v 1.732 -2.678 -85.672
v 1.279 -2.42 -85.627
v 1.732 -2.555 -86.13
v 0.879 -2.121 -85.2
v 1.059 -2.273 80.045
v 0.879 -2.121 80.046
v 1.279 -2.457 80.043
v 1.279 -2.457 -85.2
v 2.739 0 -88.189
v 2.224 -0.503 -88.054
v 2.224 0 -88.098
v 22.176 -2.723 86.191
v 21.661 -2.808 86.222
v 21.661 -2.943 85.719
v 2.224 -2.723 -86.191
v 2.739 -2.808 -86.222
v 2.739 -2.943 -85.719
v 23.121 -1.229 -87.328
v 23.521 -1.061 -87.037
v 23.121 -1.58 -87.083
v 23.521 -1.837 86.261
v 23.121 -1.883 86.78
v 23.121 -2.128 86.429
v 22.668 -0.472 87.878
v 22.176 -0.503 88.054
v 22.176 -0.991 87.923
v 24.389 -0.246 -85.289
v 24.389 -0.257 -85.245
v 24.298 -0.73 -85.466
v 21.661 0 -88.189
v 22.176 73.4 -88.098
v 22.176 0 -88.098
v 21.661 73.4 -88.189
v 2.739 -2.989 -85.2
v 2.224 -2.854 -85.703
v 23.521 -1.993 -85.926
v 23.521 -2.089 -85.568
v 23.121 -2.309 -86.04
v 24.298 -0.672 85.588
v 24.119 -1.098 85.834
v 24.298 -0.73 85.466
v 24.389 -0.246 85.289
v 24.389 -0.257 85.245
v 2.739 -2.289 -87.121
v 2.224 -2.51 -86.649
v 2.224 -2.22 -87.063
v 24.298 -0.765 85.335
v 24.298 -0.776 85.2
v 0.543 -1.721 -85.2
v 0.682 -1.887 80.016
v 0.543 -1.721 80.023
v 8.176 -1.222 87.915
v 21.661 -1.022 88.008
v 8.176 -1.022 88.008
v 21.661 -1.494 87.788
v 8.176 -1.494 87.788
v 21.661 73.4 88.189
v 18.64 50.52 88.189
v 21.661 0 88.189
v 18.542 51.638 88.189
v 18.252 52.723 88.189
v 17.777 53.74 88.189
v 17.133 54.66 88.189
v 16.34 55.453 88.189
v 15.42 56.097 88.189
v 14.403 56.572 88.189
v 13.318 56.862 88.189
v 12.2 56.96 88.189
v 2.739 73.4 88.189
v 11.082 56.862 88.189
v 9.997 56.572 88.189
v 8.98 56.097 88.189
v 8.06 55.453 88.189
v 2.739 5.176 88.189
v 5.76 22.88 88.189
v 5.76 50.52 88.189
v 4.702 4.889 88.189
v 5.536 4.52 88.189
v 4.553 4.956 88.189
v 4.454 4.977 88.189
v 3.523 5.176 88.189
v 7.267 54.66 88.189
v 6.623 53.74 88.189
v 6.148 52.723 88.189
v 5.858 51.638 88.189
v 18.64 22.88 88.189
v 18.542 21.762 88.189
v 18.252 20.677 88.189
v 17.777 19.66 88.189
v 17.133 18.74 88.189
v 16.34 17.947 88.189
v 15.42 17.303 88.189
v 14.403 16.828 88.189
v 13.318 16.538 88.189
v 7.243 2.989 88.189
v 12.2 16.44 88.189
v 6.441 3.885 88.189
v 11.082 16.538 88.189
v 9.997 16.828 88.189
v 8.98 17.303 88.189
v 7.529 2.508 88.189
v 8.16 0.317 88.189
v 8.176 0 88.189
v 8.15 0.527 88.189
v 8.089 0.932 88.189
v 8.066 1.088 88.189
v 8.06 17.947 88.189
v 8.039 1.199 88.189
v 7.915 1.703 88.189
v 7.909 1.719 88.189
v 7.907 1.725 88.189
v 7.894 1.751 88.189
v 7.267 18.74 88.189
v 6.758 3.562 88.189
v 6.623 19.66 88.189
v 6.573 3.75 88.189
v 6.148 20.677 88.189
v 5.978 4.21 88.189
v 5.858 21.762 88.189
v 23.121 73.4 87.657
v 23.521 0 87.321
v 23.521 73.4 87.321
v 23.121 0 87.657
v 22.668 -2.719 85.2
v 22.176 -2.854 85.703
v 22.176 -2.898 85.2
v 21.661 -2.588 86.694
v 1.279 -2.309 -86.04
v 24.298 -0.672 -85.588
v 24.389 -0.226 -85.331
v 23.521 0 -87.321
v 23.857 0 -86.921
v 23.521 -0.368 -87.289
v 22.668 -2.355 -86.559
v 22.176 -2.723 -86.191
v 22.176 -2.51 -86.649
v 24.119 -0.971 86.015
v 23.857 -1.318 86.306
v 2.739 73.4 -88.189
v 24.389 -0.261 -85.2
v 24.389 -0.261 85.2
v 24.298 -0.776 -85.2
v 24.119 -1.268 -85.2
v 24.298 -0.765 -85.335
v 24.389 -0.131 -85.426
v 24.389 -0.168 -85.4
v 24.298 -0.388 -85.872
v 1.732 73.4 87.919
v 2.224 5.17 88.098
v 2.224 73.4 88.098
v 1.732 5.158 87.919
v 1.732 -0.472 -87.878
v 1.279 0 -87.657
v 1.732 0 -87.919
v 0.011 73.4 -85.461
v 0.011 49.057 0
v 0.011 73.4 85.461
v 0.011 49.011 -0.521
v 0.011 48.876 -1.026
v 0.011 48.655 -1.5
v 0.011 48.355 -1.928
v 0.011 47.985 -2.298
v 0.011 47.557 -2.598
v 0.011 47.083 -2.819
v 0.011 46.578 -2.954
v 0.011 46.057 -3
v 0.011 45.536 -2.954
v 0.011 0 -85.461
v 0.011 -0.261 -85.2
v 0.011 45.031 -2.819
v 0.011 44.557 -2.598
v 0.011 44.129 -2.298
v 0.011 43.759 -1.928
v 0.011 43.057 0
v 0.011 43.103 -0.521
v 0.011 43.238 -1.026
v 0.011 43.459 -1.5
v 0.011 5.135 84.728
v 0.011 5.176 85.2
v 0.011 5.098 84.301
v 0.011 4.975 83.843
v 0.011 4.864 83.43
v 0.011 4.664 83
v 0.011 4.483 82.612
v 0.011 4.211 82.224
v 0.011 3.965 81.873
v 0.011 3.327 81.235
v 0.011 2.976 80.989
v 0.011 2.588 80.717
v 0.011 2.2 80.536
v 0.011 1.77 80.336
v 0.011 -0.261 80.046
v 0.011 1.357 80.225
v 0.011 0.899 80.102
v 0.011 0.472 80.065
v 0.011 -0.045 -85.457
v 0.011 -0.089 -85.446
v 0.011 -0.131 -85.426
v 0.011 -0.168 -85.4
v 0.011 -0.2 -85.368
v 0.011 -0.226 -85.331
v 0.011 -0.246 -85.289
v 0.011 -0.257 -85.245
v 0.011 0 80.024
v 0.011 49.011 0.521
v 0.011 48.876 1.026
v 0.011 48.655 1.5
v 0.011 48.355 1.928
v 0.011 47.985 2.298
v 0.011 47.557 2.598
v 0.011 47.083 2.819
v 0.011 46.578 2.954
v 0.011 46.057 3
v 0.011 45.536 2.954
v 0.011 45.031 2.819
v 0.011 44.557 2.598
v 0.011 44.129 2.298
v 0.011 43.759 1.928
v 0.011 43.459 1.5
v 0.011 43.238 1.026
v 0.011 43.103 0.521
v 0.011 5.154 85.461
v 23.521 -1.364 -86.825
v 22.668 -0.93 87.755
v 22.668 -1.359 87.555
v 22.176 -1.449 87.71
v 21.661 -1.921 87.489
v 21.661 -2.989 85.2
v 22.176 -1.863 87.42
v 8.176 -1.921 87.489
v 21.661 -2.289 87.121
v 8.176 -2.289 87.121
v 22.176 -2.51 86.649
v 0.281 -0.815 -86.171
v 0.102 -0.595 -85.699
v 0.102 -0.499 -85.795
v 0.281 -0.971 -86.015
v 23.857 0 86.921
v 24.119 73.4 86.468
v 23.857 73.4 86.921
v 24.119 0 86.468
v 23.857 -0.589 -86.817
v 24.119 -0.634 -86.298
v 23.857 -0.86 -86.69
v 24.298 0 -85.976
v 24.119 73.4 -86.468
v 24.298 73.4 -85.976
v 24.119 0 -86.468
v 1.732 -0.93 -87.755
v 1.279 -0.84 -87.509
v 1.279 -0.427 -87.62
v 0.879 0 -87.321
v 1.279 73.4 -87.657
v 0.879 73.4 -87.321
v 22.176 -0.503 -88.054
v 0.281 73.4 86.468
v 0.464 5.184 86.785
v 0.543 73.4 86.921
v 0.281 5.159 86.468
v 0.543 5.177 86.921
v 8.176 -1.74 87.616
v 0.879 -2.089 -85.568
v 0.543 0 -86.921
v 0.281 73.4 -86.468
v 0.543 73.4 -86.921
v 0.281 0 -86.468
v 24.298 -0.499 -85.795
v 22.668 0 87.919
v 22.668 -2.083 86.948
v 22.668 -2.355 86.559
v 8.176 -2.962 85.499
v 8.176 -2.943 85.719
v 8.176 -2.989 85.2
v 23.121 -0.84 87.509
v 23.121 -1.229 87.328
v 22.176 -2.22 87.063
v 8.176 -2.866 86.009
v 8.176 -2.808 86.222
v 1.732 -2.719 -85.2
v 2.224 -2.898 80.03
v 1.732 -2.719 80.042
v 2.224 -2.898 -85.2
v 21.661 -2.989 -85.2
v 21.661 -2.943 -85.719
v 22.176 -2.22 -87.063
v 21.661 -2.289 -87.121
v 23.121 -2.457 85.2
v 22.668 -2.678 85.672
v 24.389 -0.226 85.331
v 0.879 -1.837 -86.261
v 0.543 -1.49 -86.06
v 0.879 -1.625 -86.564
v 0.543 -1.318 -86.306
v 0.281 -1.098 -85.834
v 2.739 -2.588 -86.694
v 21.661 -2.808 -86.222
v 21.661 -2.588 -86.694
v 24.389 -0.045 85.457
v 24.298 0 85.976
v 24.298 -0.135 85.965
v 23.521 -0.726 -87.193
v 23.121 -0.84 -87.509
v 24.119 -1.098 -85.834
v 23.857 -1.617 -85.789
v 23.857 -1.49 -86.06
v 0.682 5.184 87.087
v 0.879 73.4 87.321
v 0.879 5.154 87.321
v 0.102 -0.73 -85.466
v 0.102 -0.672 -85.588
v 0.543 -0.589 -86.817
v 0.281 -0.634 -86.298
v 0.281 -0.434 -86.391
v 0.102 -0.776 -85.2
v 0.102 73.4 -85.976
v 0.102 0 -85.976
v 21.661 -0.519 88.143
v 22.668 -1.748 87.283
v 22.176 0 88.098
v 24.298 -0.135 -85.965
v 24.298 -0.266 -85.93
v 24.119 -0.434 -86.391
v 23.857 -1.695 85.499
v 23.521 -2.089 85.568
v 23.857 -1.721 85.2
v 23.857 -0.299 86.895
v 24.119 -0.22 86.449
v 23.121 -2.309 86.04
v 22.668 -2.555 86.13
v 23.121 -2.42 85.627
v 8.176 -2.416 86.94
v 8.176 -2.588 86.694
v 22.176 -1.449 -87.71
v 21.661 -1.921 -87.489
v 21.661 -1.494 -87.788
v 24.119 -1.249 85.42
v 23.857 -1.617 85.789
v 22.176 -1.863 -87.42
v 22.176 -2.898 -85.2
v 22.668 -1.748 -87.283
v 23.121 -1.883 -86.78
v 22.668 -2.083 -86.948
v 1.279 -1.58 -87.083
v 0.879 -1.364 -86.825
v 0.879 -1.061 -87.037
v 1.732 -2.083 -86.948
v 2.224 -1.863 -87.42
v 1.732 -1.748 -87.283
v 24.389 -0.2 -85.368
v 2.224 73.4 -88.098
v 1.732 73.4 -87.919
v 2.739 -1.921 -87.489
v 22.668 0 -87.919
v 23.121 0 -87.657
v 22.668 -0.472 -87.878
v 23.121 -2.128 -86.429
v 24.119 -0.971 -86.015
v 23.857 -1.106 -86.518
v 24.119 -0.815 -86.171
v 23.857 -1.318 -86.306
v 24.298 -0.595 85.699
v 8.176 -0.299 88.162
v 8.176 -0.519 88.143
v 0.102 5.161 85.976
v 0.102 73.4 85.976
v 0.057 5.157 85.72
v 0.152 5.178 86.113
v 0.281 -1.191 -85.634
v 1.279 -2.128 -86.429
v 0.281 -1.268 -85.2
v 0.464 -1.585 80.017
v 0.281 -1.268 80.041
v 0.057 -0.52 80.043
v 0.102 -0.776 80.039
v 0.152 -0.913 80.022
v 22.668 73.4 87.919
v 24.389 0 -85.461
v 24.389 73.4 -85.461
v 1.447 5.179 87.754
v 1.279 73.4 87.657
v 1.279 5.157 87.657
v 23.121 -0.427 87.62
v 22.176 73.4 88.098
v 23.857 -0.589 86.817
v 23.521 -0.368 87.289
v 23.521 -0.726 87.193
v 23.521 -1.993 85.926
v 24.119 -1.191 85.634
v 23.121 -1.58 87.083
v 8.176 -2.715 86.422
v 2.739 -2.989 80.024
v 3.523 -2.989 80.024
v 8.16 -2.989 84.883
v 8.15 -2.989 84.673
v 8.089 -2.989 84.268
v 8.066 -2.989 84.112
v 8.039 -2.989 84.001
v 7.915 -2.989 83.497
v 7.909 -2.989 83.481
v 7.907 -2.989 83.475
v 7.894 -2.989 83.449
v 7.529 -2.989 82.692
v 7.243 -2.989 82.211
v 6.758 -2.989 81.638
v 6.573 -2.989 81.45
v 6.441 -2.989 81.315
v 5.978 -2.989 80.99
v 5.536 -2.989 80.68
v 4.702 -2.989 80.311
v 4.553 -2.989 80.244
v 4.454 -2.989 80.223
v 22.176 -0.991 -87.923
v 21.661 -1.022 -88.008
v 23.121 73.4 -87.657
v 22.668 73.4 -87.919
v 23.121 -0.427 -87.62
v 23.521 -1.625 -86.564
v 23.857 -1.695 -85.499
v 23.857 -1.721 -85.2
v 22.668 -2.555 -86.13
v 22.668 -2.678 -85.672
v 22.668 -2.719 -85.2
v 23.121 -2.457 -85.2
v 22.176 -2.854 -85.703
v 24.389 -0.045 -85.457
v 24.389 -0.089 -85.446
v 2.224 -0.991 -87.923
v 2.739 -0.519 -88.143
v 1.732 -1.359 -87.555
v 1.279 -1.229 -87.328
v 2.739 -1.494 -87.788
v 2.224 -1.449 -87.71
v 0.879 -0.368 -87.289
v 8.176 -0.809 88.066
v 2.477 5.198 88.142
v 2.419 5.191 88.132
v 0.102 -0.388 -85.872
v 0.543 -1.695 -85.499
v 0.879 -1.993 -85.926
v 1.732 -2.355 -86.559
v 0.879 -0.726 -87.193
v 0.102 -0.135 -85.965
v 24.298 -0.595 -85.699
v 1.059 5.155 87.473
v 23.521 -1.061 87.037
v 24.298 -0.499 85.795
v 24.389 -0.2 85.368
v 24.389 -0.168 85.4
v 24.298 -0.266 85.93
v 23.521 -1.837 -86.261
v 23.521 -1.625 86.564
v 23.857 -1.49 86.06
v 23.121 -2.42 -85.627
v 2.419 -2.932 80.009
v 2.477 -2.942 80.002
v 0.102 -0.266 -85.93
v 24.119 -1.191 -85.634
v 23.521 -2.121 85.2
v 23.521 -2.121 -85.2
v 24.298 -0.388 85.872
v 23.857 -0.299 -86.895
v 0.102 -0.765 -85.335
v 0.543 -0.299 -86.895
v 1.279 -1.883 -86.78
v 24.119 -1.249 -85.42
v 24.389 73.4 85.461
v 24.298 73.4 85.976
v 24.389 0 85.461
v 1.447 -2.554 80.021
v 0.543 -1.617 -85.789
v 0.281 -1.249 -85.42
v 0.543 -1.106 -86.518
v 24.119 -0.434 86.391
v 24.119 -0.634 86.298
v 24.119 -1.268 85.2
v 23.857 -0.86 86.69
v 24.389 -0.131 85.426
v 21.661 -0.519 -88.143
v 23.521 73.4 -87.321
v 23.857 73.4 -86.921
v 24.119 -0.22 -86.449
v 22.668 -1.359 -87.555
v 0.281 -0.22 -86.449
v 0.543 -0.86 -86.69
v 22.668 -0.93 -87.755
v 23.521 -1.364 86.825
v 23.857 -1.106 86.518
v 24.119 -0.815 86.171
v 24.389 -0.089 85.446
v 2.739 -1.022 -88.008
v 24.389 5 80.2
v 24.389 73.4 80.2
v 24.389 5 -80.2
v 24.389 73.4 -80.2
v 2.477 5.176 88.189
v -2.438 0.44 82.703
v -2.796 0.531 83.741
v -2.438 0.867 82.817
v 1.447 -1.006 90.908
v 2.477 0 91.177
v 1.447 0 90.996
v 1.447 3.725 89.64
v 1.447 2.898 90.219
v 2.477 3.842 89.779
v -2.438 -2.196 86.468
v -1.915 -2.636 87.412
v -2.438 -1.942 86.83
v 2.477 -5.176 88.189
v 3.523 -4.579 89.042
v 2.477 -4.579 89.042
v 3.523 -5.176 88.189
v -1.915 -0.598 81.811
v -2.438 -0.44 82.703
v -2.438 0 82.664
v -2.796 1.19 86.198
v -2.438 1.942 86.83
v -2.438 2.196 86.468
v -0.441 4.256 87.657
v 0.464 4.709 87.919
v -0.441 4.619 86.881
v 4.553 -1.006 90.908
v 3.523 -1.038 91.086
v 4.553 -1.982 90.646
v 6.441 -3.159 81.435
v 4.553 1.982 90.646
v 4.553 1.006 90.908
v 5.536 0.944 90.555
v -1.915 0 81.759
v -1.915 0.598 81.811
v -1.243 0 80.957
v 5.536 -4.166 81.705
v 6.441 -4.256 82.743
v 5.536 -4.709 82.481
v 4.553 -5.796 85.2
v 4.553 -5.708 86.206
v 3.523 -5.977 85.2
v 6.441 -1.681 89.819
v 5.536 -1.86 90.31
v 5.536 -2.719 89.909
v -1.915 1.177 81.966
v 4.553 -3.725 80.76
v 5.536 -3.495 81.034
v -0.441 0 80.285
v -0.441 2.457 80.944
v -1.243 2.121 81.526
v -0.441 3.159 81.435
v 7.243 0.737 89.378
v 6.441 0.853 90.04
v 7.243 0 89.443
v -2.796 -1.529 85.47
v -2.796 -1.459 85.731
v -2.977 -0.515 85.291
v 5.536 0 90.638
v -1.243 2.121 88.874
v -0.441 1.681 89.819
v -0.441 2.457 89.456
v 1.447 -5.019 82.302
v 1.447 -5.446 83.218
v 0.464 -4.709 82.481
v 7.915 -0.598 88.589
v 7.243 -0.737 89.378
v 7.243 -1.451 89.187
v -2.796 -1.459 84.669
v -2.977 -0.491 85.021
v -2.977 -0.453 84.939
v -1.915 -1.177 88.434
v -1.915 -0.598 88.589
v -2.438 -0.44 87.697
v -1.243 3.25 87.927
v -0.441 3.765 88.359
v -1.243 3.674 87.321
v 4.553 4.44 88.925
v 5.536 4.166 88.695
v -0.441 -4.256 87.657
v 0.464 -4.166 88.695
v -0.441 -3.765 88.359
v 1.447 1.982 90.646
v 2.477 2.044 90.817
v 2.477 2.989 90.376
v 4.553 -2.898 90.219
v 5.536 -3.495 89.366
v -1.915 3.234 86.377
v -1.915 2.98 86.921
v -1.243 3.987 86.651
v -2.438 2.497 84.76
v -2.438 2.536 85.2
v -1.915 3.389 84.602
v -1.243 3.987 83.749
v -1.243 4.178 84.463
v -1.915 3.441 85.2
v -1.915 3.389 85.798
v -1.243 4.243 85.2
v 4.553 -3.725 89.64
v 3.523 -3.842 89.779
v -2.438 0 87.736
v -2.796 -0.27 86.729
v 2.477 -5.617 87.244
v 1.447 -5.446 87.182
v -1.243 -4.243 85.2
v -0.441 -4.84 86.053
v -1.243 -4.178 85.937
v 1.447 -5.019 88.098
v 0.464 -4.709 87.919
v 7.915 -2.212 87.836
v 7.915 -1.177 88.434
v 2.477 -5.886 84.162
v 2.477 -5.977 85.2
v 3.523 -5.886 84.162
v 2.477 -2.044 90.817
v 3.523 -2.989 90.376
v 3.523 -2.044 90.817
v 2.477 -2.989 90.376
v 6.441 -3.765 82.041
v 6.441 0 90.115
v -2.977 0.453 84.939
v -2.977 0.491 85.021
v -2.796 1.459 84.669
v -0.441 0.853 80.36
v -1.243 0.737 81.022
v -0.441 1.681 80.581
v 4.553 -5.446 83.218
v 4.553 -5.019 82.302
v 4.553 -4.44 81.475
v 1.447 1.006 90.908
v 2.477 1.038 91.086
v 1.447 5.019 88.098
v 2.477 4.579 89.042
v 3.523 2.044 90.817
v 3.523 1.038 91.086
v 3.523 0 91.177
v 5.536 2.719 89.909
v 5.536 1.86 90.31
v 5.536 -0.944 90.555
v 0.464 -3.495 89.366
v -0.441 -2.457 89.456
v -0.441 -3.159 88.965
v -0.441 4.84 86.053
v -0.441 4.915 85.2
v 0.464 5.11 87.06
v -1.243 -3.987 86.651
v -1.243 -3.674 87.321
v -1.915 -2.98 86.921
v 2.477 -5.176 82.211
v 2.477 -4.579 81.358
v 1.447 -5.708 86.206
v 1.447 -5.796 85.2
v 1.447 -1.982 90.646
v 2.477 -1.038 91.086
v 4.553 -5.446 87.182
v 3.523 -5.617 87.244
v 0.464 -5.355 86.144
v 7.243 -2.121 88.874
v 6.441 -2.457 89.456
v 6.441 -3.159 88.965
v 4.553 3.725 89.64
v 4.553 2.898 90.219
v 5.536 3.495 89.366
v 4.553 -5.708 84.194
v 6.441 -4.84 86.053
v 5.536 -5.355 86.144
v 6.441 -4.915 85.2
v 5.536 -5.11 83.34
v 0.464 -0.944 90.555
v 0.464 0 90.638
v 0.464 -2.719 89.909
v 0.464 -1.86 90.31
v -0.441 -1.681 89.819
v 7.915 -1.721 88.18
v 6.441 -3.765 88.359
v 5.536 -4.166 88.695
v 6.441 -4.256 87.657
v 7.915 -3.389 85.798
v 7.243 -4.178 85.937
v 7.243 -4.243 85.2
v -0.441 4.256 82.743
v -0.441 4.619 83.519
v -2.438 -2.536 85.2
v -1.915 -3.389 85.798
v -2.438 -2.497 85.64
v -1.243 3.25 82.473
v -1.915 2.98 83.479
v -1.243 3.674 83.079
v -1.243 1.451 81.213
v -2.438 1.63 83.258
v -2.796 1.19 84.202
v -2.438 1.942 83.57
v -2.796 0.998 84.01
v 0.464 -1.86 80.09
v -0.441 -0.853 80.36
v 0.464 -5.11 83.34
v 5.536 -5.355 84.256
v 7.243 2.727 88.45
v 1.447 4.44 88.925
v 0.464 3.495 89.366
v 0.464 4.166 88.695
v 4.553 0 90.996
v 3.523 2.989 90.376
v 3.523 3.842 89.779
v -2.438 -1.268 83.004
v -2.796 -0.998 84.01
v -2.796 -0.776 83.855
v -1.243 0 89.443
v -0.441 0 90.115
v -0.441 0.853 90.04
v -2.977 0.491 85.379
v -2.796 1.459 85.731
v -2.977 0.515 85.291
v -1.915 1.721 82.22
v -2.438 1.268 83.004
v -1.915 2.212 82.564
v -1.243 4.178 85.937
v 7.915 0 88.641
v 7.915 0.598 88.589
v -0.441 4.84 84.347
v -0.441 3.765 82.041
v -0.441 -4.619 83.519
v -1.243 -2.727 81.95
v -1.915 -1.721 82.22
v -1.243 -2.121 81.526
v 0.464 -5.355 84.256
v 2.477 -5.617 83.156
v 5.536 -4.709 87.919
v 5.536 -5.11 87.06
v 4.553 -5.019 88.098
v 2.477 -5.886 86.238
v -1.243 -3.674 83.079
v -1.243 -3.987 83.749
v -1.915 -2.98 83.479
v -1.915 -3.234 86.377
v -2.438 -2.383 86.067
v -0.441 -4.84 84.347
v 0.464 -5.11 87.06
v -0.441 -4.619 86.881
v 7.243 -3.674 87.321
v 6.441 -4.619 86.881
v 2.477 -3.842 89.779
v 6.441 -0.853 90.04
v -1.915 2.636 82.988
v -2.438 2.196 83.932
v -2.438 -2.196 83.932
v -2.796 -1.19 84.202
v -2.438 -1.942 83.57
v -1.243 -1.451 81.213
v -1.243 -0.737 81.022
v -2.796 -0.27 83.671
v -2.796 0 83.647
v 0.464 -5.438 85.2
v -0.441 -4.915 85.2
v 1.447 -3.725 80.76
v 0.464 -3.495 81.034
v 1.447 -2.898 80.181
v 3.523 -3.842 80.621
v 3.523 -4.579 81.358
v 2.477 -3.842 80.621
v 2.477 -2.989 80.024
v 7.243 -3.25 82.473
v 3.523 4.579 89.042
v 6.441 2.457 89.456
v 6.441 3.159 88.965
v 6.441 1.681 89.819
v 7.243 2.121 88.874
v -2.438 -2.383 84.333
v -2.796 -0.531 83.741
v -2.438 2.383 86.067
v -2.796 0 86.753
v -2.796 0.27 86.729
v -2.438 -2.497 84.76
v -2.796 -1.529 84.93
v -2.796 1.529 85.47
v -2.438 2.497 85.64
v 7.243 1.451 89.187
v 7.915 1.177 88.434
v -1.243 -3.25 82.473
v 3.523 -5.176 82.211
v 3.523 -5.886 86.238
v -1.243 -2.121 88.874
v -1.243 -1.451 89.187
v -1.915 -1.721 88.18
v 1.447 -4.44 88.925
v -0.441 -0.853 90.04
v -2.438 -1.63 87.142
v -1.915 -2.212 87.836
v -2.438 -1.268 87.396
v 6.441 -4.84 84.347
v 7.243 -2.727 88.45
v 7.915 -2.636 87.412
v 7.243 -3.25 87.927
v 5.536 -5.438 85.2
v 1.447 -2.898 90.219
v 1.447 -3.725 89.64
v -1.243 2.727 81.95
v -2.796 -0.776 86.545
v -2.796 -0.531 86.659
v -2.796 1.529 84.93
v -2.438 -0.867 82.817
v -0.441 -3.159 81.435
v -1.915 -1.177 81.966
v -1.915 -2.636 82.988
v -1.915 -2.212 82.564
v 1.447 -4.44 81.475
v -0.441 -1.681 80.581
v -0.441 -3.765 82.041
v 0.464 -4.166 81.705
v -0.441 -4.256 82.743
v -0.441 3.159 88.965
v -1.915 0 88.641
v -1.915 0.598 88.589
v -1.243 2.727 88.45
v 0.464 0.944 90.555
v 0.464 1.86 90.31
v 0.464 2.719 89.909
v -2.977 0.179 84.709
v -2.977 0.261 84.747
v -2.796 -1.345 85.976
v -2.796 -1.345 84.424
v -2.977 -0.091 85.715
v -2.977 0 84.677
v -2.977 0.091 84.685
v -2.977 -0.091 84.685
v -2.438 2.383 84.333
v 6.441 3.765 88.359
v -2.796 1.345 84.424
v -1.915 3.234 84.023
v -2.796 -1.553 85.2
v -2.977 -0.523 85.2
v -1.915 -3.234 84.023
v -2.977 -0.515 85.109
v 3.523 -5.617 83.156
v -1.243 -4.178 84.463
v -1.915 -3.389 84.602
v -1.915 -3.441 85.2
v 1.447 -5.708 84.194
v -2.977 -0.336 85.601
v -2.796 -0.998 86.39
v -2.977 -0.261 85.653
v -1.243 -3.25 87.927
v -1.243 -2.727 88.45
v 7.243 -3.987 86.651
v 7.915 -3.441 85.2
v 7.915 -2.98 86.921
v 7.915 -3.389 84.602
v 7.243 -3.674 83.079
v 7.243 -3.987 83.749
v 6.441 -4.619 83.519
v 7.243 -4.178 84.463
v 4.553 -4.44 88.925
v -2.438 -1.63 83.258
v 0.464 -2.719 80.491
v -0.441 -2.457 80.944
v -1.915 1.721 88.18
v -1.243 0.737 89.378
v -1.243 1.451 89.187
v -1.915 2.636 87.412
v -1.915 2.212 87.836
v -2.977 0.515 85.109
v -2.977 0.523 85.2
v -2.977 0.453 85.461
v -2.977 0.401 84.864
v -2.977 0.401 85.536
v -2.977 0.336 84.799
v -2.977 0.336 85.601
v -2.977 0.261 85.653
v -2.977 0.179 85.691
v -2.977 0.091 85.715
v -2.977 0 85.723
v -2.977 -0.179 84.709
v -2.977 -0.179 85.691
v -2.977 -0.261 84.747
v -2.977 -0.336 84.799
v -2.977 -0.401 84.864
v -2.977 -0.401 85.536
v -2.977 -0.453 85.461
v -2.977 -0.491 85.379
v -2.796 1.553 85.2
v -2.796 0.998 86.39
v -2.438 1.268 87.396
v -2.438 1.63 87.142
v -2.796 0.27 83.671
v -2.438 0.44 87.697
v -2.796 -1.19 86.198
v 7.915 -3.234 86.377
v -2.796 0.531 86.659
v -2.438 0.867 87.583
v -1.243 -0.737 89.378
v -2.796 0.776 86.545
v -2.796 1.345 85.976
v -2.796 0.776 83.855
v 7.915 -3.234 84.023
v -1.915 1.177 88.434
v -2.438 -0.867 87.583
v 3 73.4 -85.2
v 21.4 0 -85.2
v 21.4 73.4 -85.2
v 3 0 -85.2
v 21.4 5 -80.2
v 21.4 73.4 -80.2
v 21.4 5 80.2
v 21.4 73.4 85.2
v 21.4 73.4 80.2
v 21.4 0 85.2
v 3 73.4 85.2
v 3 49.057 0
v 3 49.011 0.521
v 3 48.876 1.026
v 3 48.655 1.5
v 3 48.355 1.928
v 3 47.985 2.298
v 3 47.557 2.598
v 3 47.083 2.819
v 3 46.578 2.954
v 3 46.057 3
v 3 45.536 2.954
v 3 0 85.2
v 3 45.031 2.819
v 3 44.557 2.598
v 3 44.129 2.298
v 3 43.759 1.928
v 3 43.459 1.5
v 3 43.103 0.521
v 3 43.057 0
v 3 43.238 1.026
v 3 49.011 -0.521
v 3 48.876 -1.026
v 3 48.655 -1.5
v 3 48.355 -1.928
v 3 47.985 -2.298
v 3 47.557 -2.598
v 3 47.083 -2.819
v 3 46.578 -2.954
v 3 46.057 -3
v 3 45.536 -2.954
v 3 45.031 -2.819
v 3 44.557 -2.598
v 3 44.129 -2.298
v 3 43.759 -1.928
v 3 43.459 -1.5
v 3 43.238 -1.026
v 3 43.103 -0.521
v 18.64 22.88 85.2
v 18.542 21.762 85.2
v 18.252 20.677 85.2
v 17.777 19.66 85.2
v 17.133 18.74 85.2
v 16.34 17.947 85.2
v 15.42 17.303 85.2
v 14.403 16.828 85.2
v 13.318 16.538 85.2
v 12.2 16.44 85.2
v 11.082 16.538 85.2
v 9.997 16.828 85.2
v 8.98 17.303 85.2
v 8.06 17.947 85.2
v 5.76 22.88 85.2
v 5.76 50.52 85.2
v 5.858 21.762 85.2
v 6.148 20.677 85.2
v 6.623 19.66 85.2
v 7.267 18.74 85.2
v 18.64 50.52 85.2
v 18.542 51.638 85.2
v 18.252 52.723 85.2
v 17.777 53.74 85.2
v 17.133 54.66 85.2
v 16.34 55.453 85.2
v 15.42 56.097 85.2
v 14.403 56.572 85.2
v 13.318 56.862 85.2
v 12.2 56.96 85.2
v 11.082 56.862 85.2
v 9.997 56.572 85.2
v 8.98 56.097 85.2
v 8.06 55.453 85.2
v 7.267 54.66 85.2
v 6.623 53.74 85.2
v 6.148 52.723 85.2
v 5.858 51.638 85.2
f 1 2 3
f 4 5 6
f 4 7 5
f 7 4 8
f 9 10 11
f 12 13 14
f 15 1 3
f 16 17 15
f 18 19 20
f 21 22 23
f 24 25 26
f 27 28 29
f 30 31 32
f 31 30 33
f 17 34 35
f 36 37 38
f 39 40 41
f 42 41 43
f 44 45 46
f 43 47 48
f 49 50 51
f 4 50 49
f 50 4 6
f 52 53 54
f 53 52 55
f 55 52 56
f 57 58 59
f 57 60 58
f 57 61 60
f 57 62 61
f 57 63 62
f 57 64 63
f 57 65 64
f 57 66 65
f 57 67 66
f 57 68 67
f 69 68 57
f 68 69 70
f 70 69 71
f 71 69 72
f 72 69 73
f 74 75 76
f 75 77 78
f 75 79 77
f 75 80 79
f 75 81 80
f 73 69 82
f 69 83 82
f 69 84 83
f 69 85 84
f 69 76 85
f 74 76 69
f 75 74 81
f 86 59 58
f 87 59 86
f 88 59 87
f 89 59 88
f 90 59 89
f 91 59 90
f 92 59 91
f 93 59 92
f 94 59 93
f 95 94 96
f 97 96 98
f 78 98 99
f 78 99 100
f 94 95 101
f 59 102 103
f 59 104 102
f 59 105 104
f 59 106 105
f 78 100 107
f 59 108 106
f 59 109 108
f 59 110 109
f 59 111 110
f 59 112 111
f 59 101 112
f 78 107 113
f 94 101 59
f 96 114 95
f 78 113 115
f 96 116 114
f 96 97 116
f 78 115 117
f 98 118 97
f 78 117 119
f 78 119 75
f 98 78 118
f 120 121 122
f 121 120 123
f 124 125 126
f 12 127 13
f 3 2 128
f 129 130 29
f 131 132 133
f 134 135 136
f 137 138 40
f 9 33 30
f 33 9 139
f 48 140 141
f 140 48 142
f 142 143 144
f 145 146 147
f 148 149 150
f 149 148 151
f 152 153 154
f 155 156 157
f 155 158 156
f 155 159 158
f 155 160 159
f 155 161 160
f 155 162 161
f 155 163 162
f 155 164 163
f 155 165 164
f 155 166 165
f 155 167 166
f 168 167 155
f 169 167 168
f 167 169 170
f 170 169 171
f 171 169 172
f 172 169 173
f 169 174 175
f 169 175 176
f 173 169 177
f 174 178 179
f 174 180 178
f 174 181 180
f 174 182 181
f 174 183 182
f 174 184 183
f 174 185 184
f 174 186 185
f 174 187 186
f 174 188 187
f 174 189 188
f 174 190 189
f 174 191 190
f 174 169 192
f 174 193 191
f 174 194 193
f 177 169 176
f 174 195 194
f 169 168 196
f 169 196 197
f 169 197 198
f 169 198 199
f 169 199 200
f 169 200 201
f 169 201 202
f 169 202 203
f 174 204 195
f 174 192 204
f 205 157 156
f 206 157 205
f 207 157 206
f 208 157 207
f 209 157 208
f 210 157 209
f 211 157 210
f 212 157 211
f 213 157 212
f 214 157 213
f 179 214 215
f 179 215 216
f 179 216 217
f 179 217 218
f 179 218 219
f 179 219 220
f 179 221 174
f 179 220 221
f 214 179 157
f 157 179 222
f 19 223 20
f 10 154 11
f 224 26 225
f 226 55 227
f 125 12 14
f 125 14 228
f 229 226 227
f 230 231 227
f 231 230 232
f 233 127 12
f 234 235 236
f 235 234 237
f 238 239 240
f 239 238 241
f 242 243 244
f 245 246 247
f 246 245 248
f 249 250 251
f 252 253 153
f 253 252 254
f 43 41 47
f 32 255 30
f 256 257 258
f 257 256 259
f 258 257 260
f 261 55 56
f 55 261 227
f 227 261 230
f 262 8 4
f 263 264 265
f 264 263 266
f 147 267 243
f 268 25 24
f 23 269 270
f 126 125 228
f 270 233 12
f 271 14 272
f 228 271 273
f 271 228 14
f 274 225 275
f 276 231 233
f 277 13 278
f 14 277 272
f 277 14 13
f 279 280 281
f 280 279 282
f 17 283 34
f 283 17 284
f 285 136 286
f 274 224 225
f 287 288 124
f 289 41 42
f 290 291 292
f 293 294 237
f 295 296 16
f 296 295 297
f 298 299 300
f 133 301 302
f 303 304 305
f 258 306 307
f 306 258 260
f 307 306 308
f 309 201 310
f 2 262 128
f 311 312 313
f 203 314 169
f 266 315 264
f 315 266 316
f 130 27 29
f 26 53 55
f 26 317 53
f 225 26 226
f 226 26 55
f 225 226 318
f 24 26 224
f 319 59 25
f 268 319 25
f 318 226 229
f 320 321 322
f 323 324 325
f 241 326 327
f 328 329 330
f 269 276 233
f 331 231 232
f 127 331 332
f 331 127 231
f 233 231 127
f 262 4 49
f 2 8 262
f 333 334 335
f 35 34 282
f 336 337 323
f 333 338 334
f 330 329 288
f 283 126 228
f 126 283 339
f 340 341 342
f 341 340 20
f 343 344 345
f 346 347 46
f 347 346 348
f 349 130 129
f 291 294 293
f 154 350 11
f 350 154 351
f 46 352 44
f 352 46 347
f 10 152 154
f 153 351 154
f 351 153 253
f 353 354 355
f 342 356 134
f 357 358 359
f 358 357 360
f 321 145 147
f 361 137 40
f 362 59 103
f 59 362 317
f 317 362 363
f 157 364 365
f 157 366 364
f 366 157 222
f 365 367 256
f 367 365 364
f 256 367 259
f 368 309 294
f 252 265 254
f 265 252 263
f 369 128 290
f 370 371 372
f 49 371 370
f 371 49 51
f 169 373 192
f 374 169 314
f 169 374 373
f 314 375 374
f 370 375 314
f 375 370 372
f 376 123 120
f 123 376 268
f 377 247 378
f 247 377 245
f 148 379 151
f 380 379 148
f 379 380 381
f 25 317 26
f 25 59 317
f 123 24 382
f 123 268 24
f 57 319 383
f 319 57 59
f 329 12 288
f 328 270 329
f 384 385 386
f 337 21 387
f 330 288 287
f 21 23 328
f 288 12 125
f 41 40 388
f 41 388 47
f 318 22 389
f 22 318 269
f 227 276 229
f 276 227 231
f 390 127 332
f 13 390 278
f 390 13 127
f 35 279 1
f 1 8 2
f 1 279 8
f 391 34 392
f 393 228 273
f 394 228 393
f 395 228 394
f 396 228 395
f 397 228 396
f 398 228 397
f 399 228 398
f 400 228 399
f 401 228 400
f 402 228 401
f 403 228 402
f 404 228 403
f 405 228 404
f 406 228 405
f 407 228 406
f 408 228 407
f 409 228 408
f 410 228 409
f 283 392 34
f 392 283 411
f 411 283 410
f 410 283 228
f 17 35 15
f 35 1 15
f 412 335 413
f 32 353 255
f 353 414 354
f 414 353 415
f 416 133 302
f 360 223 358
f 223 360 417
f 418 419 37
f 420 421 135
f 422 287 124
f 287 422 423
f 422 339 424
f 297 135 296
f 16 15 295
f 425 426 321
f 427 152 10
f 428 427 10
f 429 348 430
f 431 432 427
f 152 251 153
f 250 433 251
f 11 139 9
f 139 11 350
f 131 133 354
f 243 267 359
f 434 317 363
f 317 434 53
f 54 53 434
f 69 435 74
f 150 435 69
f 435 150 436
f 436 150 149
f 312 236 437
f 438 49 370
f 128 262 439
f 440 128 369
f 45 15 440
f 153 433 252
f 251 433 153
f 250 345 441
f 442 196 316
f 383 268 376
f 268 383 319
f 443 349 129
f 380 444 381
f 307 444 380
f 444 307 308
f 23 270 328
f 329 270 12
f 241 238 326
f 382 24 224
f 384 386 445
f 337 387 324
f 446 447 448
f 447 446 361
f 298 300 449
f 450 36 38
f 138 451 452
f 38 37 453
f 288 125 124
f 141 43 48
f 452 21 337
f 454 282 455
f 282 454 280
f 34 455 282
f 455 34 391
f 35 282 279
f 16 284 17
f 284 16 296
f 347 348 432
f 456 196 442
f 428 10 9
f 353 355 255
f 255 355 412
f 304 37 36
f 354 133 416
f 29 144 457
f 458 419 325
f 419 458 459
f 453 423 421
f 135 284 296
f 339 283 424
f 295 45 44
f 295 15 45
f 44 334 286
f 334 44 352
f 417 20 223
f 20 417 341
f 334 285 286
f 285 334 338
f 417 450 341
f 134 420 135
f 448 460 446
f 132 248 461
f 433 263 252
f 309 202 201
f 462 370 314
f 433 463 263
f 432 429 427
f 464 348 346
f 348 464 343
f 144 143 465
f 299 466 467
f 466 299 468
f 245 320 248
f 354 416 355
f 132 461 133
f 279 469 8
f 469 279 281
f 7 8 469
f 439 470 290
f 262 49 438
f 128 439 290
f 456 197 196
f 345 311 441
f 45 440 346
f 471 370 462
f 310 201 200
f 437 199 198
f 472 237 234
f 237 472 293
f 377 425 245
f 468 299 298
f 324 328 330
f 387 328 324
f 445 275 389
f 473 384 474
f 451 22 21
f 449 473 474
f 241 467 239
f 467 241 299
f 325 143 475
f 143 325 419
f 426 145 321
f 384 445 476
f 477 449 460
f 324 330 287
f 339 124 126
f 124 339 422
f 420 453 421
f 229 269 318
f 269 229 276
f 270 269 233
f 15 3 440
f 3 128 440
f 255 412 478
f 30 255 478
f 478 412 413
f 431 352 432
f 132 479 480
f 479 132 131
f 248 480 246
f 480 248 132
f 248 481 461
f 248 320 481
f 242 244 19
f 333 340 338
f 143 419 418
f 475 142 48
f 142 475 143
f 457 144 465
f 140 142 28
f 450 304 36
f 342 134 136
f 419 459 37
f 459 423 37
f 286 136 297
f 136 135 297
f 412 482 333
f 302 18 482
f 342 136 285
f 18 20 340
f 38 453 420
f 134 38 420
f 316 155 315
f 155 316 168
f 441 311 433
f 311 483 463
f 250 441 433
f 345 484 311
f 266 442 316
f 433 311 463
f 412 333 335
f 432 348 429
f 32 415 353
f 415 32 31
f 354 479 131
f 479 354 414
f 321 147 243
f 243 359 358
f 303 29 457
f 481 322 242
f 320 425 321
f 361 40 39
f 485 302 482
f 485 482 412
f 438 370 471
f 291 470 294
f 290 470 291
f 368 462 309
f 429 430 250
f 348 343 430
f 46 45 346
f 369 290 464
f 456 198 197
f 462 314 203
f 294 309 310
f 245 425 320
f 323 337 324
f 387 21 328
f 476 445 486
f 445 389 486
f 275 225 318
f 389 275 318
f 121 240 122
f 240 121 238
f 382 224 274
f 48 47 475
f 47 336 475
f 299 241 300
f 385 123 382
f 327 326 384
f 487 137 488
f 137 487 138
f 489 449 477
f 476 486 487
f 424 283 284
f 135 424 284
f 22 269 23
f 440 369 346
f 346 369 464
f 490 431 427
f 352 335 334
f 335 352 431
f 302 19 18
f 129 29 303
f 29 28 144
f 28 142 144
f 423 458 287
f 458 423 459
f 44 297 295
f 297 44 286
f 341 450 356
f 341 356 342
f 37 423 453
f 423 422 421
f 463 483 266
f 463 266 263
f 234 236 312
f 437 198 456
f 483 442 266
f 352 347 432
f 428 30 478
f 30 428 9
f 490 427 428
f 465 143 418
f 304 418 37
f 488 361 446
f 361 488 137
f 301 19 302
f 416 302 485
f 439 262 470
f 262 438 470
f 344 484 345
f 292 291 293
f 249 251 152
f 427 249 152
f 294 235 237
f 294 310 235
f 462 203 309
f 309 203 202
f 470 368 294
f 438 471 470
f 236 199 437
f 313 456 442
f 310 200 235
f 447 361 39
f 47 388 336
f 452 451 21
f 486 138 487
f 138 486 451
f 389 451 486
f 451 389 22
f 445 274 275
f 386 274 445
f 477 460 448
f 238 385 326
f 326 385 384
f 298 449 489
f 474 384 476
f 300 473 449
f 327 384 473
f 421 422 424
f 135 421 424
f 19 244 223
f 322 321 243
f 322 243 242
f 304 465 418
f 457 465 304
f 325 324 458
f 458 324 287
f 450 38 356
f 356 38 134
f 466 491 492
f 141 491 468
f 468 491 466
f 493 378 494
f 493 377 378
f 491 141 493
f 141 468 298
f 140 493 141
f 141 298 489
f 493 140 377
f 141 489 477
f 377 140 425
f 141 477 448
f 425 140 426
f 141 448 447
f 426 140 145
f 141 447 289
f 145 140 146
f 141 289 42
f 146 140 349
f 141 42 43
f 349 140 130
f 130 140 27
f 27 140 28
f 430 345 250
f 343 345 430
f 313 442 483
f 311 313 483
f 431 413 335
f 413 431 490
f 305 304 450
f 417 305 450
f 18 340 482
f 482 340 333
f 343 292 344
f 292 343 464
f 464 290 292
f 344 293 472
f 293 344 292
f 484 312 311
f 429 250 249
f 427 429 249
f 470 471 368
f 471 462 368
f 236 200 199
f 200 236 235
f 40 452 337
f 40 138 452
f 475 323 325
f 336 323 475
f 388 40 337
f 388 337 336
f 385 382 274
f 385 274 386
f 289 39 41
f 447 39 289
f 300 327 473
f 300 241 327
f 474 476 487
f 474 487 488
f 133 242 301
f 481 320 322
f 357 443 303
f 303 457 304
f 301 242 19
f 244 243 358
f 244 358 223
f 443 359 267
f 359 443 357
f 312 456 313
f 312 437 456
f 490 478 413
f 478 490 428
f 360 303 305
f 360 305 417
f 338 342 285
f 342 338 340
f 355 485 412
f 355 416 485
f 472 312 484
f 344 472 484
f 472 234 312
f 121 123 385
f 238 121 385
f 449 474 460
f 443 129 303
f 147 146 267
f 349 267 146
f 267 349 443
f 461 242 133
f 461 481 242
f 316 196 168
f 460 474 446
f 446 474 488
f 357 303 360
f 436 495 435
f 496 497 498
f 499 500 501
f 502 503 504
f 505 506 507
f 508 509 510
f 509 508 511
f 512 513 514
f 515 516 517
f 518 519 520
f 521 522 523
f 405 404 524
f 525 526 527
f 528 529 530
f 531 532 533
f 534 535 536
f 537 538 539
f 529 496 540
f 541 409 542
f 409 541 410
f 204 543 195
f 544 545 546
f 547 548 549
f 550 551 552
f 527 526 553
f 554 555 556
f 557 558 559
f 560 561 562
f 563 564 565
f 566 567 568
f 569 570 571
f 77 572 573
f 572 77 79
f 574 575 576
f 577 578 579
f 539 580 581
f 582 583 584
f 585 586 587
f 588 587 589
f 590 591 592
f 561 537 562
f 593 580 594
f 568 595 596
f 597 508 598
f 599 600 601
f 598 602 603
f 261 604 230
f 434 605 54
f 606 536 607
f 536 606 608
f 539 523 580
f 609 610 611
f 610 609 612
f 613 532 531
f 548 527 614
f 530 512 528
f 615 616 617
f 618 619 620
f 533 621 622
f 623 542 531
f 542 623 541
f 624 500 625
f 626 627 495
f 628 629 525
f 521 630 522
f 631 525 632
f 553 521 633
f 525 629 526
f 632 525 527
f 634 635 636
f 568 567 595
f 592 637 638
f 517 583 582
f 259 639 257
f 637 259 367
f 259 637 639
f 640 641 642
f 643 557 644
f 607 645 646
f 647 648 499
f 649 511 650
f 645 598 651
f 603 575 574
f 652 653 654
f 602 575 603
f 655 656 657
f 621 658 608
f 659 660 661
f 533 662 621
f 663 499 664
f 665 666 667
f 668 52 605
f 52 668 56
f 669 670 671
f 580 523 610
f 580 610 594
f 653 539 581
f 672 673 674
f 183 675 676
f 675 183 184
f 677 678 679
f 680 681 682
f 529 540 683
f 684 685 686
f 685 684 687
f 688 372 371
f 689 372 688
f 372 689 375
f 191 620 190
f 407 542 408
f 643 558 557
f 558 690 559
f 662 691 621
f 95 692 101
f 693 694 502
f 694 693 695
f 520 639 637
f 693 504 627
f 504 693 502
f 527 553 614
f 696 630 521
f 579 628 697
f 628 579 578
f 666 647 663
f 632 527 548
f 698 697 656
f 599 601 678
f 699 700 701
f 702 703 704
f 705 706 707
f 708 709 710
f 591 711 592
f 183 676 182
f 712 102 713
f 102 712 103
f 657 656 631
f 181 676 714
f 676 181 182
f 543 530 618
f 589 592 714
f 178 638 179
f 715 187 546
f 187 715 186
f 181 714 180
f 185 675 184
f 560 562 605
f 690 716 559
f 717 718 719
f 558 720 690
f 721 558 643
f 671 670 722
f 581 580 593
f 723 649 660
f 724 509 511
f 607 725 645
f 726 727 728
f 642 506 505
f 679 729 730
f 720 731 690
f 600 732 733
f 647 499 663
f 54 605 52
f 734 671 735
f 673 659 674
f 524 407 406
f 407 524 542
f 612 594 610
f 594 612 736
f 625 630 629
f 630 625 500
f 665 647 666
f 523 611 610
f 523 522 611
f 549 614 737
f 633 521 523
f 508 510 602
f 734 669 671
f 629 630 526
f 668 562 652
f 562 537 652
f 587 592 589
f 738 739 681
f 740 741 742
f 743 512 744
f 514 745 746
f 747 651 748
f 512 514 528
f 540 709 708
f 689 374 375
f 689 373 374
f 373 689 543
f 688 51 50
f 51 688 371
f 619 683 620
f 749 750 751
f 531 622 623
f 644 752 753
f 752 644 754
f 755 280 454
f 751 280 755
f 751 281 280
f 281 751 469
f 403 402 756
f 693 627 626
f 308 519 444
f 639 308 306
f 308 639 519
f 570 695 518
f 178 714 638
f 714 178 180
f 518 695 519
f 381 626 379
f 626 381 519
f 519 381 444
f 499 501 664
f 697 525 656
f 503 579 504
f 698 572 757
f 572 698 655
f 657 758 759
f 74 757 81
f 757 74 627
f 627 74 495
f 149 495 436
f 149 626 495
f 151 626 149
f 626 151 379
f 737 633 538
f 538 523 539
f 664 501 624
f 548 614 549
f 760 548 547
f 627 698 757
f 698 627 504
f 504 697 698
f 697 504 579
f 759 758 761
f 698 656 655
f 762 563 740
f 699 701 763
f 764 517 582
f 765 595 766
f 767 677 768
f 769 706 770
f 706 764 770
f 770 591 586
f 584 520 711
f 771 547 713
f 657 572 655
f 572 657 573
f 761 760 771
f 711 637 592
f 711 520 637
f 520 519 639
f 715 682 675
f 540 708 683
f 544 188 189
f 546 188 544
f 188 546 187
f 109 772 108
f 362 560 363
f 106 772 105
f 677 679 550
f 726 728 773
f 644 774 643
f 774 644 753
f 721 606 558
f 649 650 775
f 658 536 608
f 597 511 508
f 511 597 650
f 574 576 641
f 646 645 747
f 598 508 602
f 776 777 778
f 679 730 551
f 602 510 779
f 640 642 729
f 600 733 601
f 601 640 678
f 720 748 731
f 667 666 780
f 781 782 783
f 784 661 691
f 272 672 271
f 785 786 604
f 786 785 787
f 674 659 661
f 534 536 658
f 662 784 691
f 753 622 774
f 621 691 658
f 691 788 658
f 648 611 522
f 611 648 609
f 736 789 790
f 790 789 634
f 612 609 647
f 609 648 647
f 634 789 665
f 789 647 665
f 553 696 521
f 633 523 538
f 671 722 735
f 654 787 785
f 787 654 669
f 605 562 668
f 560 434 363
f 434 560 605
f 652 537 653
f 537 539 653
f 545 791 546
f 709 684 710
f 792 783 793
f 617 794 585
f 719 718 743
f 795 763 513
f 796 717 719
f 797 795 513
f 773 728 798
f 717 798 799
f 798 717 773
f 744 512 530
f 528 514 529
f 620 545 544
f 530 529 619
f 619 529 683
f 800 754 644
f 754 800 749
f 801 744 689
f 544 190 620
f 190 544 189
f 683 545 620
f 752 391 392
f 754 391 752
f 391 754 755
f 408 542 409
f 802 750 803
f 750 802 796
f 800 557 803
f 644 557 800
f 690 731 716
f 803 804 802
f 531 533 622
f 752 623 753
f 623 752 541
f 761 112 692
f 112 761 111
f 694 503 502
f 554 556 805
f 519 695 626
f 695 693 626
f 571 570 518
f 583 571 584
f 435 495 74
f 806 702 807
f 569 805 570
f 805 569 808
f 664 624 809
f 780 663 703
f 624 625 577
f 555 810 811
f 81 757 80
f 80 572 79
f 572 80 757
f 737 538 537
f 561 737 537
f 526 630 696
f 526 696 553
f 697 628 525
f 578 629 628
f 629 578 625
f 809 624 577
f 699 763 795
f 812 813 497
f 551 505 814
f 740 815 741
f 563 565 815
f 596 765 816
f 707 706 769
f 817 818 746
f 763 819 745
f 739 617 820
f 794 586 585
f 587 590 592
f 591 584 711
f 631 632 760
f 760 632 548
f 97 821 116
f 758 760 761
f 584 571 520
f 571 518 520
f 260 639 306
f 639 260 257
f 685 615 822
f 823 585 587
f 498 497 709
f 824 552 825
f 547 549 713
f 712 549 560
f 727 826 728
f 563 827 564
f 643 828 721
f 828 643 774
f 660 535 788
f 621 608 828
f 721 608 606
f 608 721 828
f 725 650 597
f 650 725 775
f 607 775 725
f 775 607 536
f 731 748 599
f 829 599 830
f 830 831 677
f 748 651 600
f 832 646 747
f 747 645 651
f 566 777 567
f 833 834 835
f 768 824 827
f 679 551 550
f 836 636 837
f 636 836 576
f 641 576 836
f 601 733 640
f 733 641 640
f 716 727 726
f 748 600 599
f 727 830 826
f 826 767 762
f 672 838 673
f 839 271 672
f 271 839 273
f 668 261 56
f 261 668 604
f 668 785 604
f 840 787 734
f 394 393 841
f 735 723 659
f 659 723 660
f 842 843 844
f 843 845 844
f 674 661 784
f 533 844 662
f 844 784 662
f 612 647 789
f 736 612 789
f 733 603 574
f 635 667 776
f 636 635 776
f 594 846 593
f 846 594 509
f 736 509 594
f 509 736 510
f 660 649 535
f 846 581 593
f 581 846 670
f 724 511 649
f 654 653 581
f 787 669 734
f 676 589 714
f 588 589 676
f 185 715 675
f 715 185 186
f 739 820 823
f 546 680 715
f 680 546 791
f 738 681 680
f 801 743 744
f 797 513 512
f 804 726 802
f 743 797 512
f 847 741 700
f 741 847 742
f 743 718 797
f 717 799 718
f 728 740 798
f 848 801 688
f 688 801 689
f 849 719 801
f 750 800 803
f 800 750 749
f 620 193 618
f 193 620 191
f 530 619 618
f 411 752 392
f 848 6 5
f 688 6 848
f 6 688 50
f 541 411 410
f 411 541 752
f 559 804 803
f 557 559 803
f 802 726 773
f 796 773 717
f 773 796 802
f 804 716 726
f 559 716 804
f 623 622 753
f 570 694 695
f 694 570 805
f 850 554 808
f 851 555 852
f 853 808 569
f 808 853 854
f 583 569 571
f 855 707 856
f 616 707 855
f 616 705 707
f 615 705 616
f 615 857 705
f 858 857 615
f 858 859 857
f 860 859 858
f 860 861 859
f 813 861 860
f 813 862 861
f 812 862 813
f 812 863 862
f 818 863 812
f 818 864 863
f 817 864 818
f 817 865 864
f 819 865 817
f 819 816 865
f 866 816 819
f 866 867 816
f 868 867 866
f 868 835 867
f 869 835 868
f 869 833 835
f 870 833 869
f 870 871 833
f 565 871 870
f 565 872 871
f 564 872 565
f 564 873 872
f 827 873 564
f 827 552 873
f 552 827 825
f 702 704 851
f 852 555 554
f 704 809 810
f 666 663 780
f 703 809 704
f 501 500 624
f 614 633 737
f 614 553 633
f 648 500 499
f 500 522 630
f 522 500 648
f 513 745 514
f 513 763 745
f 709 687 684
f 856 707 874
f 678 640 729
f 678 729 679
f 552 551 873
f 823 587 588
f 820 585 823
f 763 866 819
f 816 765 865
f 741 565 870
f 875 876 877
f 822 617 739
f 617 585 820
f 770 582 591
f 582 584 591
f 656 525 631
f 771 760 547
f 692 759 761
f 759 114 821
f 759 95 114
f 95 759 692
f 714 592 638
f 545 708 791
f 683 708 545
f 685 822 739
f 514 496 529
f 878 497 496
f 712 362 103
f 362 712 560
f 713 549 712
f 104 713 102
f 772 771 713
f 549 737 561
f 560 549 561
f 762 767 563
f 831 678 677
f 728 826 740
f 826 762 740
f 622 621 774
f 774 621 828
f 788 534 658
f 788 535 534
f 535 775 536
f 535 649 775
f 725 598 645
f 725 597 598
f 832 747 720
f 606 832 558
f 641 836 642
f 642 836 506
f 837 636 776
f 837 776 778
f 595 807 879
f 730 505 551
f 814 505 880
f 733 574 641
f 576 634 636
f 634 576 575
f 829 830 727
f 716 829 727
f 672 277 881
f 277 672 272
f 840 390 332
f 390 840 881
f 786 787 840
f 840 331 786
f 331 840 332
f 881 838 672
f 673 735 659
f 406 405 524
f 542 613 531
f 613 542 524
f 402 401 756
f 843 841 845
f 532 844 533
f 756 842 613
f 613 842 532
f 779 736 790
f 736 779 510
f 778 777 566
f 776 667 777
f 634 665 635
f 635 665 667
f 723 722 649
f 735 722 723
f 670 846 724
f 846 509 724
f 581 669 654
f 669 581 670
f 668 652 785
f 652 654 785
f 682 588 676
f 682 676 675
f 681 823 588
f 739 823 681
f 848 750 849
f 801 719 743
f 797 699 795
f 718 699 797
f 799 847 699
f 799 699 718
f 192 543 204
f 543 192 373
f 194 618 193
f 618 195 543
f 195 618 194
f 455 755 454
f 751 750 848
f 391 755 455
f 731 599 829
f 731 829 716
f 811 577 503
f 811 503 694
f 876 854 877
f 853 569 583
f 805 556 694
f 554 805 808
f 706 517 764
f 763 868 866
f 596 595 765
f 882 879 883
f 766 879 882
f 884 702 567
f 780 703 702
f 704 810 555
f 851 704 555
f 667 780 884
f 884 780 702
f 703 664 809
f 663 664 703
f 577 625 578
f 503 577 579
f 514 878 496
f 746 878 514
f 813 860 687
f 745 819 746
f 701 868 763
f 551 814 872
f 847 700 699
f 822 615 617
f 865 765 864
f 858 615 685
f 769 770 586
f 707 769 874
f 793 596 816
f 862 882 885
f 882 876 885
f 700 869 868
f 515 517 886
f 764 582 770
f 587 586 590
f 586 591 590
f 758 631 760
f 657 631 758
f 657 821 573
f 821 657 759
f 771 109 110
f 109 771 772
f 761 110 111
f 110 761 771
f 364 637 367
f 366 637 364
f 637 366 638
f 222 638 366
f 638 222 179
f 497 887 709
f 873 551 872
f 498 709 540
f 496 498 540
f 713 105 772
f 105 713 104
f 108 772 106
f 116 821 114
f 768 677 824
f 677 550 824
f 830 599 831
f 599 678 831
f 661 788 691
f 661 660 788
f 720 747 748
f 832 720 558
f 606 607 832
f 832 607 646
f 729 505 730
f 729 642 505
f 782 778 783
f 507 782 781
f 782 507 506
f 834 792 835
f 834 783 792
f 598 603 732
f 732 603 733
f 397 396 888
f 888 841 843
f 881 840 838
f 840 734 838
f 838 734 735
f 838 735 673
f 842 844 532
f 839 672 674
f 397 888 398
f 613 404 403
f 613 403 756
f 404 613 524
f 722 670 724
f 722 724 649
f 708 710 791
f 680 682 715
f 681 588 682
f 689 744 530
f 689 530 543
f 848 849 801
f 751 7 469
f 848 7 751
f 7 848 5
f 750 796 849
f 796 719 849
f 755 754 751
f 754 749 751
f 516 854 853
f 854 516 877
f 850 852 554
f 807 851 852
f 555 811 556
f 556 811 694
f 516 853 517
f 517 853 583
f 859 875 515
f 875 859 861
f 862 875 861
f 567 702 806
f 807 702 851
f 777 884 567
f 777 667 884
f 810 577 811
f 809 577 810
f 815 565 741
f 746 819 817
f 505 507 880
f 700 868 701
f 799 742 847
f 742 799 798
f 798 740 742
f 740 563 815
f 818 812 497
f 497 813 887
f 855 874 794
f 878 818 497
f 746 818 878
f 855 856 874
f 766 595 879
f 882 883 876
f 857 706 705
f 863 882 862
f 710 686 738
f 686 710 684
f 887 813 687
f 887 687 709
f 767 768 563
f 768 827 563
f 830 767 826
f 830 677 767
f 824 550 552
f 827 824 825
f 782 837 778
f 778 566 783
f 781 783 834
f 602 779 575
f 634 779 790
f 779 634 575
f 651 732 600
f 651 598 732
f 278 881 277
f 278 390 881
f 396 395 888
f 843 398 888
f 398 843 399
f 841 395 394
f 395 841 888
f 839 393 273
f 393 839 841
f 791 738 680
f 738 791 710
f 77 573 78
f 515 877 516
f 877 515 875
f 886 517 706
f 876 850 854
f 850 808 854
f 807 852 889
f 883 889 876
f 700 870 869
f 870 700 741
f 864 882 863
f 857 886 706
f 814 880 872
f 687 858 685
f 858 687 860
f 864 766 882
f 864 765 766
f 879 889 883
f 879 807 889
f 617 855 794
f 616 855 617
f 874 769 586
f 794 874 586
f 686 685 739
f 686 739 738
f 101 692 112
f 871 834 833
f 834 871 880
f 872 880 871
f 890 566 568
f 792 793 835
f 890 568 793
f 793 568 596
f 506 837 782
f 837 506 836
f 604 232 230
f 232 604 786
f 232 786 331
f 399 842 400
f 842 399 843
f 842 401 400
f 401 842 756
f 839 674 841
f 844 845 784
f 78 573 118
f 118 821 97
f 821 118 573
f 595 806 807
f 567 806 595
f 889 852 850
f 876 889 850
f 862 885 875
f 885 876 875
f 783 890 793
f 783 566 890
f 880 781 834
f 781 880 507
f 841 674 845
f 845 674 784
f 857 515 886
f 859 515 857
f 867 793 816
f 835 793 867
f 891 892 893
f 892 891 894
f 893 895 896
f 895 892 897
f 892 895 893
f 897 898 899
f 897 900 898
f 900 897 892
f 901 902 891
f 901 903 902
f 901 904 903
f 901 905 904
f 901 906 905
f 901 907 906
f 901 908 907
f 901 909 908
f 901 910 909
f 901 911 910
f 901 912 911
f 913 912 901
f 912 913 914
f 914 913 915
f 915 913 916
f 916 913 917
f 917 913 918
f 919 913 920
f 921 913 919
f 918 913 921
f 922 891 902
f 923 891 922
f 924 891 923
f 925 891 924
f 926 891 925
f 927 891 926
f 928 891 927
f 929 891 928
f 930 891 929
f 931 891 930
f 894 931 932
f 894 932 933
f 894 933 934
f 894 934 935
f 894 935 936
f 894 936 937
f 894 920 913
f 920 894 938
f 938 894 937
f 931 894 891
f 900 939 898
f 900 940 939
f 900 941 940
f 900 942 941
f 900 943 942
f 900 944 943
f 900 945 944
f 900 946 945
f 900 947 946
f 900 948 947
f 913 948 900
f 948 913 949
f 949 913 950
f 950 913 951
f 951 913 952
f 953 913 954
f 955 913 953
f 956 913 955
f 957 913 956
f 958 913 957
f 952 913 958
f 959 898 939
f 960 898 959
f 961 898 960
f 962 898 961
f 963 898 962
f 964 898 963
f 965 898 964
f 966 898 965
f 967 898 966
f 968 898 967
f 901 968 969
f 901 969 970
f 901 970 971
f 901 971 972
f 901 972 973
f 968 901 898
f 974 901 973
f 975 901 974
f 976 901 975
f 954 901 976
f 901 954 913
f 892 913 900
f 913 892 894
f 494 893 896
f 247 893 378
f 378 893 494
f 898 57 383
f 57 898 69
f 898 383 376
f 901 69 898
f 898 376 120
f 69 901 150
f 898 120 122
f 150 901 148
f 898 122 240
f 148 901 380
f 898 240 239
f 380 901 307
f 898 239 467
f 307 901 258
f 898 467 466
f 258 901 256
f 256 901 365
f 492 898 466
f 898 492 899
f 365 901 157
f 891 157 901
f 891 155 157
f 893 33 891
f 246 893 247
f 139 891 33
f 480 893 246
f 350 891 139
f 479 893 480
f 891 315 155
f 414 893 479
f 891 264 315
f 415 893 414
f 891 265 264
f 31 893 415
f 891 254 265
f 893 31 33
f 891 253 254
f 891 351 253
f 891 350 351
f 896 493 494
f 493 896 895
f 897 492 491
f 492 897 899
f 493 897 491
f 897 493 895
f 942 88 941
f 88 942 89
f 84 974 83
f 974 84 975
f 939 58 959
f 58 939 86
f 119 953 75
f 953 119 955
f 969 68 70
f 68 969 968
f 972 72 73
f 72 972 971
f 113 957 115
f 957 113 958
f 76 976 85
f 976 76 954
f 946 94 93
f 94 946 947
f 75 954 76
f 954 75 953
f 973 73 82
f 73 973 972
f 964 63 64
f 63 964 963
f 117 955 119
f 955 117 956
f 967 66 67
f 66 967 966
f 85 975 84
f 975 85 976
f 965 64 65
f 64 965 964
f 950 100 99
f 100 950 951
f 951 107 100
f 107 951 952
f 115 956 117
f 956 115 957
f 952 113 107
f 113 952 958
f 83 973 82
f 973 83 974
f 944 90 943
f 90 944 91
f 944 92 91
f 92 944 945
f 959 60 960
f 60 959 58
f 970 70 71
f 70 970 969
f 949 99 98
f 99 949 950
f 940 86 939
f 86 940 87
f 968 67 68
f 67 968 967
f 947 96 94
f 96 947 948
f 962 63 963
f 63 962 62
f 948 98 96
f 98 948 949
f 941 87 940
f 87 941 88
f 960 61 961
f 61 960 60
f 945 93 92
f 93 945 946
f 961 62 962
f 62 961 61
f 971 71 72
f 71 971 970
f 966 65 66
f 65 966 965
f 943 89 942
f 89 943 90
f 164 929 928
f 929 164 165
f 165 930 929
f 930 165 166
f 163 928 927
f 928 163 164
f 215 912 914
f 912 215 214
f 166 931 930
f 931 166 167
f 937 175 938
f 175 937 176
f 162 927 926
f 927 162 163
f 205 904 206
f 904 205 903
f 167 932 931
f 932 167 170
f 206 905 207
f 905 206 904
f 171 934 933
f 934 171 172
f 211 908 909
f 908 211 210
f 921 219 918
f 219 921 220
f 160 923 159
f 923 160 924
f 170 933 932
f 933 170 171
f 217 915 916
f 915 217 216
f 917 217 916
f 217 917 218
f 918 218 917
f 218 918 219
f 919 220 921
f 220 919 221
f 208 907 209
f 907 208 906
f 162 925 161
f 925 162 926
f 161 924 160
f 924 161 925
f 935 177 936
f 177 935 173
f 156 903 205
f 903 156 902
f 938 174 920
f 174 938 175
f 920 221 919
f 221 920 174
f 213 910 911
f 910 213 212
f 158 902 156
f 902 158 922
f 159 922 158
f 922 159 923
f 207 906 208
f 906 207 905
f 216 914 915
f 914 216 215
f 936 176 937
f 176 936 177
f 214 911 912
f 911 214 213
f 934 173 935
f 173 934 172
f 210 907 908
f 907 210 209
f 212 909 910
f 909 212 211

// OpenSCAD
$fn       = 36;
ROUNDED   = 2;
TOLERANCE = .2;

WIDTH     = 170 + TOLERANCE*2;
HEIGHT    =  83 + TOLERANCE*2;
THICKNESS =  18 + TOLERANCE*2;

SHORTEN   =  10;

WALL      =   3;

module attachment(thickness, full=true) {
    w = 46.5;
    h = 65;
    translate([-w/2, WALL, 0])
    linear_extrude(height=thickness)
    resize([w, h, 1])
    import(full ? "attachment-full.dxf" : "attachment.dxf");
}

module attachment_hole() {
    translate([0, 33.057+WALL+10, -50])
    cylinder(d=20, h=50, $fn=36);
}

module attachment_hole2() {
    translate([0, 33.057+WALL+10, -50])
    cylinder(d=6, h=50, $fn=36);
}

module phone() {
    cube([WIDTH, HEIGHT, THICKNESS]);
}

module case() {
    difference() {
        union() {
            minkowski() {
                phone();
                sphere(r=WALL);
            }

            minkowski() {
                translate([WIDTH/2, 0, -WALL])
                attachment(WALL*2);
                sphere(r=WALL*2);
            }
        }

        phone();

        // cutoff top
        translate([-WIDTH/2, HEIGHT-SHORTEN, -THICKNESS/2])
        cube([WIDTH*2, HEIGHT, THICKNESS*2]);
        
        // cutoff front
        translate([SHORTEN/2, SHORTEN/2, SHORTEN])
        scale([(WIDTH-SHORTEN)/WIDTH, 1, 1])
        phone();
        
        // cutoff left side
        d = THICKNESS *.7;
        hull() {
            translate([-10, d + SHORTEN, d/2 + (THICKNESS-d)/2])
            rotate([0, 90, 0])
            cylinder(d=d, h=50);
            translate([-10, HEIGHT-SHORTEN -d-SHORTEN, d/2 + (THICKNESS-d)/2])
            rotate([0, 90, 0])
            cylinder(d=d, h=50);
        }
        
        translate([WIDTH/2, 0, -1.5])
        attachment(WALL*2, full=true);

        translate([WIDTH/2, 0, -WALL*4.5])
        attachment(WALL*2, full=true);

        translate([WIDTH/2, 0, -WALL*2])
        attachment_hole();

        translate([WIDTH/2, 0, 0])
        attachment_hole2();

    }
}

rotate([0, 90, 0])
translate([-WIDTH/2, 0, WALL])
case();
